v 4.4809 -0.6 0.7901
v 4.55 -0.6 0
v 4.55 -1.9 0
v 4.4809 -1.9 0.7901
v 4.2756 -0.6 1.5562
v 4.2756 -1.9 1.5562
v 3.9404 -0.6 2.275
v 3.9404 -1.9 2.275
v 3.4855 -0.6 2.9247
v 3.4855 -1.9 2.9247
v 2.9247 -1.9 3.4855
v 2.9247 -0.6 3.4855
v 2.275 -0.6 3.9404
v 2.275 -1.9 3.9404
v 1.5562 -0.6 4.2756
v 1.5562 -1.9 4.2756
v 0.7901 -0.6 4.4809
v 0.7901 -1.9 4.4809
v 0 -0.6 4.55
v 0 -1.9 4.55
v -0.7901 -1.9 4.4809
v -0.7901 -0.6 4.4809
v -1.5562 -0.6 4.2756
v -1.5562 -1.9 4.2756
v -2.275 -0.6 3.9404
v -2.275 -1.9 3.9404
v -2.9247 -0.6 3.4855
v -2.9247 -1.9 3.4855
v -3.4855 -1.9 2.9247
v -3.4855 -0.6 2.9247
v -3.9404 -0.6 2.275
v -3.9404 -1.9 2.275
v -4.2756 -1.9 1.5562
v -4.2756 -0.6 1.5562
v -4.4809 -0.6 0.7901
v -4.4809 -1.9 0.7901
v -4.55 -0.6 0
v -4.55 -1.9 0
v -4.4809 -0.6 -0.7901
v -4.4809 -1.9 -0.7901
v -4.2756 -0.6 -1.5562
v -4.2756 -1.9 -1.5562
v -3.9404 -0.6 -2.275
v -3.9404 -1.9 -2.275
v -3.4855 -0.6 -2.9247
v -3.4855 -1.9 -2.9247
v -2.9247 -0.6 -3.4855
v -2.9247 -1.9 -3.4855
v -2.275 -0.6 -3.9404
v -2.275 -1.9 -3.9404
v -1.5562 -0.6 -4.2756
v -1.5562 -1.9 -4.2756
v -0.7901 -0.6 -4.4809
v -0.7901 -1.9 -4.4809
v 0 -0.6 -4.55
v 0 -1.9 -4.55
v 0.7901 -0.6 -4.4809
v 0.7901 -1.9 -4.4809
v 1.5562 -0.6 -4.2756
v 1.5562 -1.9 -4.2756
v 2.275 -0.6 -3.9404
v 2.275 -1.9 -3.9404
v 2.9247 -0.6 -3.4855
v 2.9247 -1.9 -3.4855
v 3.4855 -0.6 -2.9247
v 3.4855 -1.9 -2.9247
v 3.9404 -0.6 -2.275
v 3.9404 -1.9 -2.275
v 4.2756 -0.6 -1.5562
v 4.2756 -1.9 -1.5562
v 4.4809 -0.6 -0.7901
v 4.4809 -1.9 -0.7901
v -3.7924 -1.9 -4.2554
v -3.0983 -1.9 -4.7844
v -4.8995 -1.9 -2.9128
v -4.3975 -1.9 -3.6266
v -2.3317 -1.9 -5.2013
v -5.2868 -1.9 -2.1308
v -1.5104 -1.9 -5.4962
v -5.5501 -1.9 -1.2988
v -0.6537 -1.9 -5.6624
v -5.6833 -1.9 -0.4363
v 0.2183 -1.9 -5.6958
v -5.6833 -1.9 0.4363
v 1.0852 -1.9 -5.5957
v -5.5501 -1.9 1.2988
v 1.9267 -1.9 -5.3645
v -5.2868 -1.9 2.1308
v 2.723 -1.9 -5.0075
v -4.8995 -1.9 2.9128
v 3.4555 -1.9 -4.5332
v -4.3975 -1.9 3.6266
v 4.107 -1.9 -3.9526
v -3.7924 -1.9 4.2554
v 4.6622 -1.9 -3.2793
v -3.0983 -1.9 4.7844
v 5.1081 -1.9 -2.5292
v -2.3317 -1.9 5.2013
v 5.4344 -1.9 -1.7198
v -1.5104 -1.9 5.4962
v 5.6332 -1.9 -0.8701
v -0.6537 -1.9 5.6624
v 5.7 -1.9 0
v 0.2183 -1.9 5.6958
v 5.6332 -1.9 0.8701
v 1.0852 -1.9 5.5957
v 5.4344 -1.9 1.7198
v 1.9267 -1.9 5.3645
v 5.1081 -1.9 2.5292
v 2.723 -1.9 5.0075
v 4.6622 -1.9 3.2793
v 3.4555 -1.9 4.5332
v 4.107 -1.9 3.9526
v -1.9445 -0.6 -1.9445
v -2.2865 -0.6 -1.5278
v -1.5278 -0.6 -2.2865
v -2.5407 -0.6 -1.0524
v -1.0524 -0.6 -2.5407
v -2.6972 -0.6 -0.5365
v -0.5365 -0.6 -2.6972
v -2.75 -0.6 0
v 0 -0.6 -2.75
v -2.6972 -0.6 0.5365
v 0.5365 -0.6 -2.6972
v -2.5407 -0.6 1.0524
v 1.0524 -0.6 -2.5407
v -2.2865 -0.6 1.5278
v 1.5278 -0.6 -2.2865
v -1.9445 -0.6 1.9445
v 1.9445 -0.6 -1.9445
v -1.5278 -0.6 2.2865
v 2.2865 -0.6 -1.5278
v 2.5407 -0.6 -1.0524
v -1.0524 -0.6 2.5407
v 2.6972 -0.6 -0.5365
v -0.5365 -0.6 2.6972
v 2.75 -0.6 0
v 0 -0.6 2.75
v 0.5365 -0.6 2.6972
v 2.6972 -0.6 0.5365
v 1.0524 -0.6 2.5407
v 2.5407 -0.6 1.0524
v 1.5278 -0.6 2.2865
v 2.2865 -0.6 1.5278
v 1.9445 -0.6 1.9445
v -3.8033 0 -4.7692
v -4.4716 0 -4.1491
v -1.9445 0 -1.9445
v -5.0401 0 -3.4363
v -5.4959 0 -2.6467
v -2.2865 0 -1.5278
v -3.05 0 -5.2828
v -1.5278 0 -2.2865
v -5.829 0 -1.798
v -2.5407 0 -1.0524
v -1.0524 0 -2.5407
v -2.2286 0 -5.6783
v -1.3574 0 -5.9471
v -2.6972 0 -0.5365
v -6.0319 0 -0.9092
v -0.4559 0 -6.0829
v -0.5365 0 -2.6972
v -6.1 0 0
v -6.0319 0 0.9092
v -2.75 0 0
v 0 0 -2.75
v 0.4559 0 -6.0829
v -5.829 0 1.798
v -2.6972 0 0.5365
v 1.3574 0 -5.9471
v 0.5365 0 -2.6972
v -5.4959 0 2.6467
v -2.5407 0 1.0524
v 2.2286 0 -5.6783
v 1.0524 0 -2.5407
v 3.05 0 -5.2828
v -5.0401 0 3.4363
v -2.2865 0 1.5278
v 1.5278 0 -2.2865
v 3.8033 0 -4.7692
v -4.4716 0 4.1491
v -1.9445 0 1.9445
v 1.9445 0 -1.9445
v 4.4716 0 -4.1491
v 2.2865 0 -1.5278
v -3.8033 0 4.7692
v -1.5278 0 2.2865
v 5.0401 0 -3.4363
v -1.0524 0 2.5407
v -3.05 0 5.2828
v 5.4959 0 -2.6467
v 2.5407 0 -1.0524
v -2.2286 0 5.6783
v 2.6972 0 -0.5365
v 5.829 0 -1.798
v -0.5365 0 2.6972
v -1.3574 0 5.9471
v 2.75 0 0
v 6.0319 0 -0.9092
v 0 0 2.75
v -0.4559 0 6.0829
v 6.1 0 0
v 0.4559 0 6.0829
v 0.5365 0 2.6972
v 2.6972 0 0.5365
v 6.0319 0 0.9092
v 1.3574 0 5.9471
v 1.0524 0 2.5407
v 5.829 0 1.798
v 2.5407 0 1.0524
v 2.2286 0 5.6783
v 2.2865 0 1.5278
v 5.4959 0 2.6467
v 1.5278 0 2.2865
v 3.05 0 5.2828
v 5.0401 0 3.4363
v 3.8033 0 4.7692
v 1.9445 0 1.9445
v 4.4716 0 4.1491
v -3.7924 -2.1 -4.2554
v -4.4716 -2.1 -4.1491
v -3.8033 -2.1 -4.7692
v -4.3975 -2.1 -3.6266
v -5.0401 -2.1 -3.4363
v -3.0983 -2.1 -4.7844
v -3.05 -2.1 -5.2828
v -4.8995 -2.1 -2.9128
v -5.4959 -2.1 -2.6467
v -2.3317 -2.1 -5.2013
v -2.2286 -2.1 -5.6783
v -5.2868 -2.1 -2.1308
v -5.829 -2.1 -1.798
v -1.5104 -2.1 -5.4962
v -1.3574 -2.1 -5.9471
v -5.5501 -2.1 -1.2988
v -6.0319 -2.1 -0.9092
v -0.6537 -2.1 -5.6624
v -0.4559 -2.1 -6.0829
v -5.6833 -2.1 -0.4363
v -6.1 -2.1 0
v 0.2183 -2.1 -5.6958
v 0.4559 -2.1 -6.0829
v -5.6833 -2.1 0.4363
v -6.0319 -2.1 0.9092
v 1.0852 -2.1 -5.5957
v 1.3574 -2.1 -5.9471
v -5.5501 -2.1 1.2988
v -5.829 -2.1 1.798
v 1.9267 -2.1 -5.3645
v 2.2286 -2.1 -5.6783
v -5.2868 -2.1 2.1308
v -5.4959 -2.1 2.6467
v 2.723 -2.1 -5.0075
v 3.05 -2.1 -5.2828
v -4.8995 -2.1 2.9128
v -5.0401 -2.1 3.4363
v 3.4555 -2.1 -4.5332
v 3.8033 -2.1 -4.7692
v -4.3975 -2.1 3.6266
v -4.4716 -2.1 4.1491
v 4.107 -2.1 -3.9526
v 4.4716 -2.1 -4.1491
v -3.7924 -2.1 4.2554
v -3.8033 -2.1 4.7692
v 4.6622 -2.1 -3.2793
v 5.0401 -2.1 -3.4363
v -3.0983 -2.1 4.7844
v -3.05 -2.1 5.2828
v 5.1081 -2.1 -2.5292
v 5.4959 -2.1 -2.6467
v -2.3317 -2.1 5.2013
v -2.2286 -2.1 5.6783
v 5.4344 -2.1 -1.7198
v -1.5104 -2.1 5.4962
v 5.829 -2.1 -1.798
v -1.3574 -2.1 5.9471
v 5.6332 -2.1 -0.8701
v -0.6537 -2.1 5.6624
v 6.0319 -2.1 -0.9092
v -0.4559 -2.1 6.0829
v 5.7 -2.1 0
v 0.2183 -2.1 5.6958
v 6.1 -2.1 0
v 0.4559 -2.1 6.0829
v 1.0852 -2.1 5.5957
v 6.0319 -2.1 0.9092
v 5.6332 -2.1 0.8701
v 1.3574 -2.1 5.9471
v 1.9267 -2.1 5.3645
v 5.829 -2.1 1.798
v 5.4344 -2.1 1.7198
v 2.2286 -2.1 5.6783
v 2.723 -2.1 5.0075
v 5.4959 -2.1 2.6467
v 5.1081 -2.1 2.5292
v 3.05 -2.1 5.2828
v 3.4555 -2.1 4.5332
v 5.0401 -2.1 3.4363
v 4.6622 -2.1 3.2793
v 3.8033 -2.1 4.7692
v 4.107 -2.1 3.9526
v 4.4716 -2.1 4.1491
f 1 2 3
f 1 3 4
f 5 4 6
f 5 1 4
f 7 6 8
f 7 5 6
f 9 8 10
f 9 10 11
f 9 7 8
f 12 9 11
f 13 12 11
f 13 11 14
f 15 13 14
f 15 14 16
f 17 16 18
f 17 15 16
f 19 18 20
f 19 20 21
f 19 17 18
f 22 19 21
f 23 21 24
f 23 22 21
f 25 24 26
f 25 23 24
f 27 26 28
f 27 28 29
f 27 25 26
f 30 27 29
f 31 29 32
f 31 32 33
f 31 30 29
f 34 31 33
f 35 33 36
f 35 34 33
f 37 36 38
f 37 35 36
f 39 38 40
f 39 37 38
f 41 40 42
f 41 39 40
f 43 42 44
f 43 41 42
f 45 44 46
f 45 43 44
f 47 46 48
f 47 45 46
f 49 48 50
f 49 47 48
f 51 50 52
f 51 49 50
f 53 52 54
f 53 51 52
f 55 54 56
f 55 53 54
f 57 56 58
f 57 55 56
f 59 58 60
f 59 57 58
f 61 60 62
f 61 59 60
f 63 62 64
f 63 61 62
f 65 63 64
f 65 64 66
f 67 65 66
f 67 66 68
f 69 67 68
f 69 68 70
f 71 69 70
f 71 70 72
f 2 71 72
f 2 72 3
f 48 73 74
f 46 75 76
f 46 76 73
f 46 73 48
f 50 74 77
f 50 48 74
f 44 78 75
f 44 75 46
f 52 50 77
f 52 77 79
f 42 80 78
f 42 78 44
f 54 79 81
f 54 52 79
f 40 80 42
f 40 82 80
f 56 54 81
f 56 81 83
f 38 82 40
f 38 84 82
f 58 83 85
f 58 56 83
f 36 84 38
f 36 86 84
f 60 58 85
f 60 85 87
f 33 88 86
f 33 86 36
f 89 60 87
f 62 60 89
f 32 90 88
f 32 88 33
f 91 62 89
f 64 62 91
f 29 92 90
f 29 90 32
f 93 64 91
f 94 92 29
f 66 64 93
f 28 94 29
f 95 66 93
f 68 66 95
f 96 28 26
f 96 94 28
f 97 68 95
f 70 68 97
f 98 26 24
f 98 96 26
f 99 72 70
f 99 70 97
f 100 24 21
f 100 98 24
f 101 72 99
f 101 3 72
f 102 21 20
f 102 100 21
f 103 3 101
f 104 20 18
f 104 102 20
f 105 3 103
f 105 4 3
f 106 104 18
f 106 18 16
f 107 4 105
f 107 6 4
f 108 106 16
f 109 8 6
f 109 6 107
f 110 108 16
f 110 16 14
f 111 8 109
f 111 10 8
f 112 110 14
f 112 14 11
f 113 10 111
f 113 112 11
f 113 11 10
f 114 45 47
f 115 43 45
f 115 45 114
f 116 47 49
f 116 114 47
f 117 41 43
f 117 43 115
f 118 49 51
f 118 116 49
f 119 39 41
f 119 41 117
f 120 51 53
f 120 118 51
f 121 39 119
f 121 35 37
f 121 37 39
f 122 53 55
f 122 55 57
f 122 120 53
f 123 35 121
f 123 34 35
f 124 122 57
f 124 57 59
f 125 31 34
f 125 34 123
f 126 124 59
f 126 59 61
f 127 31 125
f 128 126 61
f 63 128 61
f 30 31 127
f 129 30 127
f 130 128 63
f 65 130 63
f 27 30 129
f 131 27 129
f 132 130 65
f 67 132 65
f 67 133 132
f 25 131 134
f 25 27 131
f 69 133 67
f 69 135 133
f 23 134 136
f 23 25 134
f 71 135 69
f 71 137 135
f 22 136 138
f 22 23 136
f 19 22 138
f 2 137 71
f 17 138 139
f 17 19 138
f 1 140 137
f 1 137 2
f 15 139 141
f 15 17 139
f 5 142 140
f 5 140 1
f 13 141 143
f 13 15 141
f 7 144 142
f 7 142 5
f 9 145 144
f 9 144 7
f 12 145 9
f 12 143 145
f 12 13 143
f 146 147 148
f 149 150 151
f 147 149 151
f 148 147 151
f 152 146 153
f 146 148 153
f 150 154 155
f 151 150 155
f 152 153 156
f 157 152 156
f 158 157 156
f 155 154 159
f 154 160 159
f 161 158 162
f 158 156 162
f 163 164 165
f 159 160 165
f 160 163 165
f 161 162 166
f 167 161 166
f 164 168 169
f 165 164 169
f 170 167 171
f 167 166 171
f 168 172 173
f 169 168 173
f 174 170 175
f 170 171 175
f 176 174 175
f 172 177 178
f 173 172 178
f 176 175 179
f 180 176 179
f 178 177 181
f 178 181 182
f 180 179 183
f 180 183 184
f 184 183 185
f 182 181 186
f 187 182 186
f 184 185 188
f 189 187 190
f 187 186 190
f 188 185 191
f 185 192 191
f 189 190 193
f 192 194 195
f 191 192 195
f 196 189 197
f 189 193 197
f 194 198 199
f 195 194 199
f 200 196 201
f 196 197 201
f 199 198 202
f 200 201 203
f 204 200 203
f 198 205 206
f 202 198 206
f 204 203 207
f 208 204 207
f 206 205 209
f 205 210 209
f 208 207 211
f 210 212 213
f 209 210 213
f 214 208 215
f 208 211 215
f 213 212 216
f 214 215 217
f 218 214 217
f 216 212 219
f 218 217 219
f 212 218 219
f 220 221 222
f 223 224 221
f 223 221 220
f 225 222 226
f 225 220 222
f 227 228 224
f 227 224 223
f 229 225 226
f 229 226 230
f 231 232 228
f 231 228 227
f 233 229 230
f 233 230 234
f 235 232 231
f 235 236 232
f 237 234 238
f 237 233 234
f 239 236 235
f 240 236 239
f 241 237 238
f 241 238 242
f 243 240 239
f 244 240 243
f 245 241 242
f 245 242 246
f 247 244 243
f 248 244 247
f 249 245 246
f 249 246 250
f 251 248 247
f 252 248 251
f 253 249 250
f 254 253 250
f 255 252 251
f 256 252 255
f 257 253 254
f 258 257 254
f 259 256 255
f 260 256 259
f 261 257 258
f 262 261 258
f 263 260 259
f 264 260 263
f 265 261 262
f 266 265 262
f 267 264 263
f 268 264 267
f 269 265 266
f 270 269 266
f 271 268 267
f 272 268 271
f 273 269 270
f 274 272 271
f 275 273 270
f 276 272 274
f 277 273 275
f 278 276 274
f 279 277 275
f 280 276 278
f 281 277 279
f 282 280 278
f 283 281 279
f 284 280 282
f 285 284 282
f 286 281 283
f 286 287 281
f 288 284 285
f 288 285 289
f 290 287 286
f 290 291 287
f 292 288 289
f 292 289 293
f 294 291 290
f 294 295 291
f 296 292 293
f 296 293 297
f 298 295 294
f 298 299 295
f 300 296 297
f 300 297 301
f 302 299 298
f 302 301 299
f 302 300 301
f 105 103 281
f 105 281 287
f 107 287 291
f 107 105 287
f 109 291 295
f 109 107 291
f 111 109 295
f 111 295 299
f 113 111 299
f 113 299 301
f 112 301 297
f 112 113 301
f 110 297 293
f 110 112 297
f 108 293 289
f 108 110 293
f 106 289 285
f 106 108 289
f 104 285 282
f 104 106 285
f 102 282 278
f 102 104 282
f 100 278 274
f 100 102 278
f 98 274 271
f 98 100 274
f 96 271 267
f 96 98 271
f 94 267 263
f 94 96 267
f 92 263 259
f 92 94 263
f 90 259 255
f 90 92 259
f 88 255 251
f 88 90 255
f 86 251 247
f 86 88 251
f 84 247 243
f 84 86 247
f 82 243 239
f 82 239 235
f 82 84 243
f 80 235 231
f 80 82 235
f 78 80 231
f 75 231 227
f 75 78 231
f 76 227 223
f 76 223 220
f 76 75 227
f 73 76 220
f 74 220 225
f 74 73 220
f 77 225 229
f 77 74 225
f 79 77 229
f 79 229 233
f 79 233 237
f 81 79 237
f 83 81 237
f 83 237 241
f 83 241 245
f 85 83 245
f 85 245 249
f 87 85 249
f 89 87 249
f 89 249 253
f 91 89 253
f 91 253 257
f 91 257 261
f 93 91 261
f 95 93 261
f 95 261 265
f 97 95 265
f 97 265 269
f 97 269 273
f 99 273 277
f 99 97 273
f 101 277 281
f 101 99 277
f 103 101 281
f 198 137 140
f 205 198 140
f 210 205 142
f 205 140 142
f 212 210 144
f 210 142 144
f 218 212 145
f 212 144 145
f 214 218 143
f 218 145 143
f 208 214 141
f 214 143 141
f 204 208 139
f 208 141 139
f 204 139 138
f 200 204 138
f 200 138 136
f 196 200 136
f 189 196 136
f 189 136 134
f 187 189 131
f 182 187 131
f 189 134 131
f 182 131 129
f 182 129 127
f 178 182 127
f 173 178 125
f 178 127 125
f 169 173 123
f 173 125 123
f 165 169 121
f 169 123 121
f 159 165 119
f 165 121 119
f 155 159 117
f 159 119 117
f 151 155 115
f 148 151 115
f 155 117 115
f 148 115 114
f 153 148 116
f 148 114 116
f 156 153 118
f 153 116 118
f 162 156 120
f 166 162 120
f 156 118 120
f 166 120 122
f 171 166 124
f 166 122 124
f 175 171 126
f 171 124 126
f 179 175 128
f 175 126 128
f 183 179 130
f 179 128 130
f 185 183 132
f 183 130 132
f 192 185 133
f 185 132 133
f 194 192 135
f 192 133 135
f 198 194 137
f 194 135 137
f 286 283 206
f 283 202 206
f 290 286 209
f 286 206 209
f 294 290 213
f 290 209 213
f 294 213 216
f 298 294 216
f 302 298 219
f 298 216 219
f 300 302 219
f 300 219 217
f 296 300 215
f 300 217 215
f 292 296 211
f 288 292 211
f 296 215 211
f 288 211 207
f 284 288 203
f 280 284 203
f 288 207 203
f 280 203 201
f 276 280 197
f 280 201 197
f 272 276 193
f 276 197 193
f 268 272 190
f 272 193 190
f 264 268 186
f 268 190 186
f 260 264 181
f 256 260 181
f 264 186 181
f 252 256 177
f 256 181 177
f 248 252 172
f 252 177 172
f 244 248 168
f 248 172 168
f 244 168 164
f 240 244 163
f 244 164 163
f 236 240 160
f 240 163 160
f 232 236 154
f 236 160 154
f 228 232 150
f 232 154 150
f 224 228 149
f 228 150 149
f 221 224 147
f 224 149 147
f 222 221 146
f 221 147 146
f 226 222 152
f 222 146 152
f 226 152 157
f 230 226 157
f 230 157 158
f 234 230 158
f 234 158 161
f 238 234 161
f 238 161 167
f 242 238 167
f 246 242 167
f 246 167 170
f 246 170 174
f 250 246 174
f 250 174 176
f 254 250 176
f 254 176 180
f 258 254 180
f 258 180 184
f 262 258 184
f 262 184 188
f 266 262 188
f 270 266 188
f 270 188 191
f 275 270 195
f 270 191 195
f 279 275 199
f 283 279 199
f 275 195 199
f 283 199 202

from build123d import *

# Parameters (mm, degrees)
F0_R     = 6.1
F1_DEPTH = 0.6
F2_R     = 6.1
F2_R_2   = 4.55
F3_DEPTH = 1.3
F4_R     = 2.75
F5_DEPTH = 0.6
F6_R     = 6.1
F6_R_2   = 5.7
F7_DEPTH = 0.2


with BuildPart() as f1:
    # F0 (on Front) → F1 (new body)
    with BuildSketch(Plane.XZ):
        Circle(F0_R)
    extrude(amount=F1_DEPTH)

    # F2 (on face) → F3 (join)
    with BuildSketch(Plane.XZ.offset(0.6)):
        Circle(F2_R)
        Circle(F2_R_2, mode=Mode.SUBTRACT)
    extrude(amount=F3_DEPTH)

    # F4 (on face) → F5 (cut)
    with BuildSketch(Plane.XZ.offset(0.6)):
        Circle(F4_R)
    extrude(amount=-F5_DEPTH, mode=Mode.SUBTRACT)

    # F6 (on face) → F7 (join)
    with BuildSketch(Plane.XZ.offset(1.9)):
        Circle(F6_R)
        Circle(F6_R_2, mode=Mode.SUBTRACT)
    extrude(amount=F7_DEPTH)


solid = f1.part
